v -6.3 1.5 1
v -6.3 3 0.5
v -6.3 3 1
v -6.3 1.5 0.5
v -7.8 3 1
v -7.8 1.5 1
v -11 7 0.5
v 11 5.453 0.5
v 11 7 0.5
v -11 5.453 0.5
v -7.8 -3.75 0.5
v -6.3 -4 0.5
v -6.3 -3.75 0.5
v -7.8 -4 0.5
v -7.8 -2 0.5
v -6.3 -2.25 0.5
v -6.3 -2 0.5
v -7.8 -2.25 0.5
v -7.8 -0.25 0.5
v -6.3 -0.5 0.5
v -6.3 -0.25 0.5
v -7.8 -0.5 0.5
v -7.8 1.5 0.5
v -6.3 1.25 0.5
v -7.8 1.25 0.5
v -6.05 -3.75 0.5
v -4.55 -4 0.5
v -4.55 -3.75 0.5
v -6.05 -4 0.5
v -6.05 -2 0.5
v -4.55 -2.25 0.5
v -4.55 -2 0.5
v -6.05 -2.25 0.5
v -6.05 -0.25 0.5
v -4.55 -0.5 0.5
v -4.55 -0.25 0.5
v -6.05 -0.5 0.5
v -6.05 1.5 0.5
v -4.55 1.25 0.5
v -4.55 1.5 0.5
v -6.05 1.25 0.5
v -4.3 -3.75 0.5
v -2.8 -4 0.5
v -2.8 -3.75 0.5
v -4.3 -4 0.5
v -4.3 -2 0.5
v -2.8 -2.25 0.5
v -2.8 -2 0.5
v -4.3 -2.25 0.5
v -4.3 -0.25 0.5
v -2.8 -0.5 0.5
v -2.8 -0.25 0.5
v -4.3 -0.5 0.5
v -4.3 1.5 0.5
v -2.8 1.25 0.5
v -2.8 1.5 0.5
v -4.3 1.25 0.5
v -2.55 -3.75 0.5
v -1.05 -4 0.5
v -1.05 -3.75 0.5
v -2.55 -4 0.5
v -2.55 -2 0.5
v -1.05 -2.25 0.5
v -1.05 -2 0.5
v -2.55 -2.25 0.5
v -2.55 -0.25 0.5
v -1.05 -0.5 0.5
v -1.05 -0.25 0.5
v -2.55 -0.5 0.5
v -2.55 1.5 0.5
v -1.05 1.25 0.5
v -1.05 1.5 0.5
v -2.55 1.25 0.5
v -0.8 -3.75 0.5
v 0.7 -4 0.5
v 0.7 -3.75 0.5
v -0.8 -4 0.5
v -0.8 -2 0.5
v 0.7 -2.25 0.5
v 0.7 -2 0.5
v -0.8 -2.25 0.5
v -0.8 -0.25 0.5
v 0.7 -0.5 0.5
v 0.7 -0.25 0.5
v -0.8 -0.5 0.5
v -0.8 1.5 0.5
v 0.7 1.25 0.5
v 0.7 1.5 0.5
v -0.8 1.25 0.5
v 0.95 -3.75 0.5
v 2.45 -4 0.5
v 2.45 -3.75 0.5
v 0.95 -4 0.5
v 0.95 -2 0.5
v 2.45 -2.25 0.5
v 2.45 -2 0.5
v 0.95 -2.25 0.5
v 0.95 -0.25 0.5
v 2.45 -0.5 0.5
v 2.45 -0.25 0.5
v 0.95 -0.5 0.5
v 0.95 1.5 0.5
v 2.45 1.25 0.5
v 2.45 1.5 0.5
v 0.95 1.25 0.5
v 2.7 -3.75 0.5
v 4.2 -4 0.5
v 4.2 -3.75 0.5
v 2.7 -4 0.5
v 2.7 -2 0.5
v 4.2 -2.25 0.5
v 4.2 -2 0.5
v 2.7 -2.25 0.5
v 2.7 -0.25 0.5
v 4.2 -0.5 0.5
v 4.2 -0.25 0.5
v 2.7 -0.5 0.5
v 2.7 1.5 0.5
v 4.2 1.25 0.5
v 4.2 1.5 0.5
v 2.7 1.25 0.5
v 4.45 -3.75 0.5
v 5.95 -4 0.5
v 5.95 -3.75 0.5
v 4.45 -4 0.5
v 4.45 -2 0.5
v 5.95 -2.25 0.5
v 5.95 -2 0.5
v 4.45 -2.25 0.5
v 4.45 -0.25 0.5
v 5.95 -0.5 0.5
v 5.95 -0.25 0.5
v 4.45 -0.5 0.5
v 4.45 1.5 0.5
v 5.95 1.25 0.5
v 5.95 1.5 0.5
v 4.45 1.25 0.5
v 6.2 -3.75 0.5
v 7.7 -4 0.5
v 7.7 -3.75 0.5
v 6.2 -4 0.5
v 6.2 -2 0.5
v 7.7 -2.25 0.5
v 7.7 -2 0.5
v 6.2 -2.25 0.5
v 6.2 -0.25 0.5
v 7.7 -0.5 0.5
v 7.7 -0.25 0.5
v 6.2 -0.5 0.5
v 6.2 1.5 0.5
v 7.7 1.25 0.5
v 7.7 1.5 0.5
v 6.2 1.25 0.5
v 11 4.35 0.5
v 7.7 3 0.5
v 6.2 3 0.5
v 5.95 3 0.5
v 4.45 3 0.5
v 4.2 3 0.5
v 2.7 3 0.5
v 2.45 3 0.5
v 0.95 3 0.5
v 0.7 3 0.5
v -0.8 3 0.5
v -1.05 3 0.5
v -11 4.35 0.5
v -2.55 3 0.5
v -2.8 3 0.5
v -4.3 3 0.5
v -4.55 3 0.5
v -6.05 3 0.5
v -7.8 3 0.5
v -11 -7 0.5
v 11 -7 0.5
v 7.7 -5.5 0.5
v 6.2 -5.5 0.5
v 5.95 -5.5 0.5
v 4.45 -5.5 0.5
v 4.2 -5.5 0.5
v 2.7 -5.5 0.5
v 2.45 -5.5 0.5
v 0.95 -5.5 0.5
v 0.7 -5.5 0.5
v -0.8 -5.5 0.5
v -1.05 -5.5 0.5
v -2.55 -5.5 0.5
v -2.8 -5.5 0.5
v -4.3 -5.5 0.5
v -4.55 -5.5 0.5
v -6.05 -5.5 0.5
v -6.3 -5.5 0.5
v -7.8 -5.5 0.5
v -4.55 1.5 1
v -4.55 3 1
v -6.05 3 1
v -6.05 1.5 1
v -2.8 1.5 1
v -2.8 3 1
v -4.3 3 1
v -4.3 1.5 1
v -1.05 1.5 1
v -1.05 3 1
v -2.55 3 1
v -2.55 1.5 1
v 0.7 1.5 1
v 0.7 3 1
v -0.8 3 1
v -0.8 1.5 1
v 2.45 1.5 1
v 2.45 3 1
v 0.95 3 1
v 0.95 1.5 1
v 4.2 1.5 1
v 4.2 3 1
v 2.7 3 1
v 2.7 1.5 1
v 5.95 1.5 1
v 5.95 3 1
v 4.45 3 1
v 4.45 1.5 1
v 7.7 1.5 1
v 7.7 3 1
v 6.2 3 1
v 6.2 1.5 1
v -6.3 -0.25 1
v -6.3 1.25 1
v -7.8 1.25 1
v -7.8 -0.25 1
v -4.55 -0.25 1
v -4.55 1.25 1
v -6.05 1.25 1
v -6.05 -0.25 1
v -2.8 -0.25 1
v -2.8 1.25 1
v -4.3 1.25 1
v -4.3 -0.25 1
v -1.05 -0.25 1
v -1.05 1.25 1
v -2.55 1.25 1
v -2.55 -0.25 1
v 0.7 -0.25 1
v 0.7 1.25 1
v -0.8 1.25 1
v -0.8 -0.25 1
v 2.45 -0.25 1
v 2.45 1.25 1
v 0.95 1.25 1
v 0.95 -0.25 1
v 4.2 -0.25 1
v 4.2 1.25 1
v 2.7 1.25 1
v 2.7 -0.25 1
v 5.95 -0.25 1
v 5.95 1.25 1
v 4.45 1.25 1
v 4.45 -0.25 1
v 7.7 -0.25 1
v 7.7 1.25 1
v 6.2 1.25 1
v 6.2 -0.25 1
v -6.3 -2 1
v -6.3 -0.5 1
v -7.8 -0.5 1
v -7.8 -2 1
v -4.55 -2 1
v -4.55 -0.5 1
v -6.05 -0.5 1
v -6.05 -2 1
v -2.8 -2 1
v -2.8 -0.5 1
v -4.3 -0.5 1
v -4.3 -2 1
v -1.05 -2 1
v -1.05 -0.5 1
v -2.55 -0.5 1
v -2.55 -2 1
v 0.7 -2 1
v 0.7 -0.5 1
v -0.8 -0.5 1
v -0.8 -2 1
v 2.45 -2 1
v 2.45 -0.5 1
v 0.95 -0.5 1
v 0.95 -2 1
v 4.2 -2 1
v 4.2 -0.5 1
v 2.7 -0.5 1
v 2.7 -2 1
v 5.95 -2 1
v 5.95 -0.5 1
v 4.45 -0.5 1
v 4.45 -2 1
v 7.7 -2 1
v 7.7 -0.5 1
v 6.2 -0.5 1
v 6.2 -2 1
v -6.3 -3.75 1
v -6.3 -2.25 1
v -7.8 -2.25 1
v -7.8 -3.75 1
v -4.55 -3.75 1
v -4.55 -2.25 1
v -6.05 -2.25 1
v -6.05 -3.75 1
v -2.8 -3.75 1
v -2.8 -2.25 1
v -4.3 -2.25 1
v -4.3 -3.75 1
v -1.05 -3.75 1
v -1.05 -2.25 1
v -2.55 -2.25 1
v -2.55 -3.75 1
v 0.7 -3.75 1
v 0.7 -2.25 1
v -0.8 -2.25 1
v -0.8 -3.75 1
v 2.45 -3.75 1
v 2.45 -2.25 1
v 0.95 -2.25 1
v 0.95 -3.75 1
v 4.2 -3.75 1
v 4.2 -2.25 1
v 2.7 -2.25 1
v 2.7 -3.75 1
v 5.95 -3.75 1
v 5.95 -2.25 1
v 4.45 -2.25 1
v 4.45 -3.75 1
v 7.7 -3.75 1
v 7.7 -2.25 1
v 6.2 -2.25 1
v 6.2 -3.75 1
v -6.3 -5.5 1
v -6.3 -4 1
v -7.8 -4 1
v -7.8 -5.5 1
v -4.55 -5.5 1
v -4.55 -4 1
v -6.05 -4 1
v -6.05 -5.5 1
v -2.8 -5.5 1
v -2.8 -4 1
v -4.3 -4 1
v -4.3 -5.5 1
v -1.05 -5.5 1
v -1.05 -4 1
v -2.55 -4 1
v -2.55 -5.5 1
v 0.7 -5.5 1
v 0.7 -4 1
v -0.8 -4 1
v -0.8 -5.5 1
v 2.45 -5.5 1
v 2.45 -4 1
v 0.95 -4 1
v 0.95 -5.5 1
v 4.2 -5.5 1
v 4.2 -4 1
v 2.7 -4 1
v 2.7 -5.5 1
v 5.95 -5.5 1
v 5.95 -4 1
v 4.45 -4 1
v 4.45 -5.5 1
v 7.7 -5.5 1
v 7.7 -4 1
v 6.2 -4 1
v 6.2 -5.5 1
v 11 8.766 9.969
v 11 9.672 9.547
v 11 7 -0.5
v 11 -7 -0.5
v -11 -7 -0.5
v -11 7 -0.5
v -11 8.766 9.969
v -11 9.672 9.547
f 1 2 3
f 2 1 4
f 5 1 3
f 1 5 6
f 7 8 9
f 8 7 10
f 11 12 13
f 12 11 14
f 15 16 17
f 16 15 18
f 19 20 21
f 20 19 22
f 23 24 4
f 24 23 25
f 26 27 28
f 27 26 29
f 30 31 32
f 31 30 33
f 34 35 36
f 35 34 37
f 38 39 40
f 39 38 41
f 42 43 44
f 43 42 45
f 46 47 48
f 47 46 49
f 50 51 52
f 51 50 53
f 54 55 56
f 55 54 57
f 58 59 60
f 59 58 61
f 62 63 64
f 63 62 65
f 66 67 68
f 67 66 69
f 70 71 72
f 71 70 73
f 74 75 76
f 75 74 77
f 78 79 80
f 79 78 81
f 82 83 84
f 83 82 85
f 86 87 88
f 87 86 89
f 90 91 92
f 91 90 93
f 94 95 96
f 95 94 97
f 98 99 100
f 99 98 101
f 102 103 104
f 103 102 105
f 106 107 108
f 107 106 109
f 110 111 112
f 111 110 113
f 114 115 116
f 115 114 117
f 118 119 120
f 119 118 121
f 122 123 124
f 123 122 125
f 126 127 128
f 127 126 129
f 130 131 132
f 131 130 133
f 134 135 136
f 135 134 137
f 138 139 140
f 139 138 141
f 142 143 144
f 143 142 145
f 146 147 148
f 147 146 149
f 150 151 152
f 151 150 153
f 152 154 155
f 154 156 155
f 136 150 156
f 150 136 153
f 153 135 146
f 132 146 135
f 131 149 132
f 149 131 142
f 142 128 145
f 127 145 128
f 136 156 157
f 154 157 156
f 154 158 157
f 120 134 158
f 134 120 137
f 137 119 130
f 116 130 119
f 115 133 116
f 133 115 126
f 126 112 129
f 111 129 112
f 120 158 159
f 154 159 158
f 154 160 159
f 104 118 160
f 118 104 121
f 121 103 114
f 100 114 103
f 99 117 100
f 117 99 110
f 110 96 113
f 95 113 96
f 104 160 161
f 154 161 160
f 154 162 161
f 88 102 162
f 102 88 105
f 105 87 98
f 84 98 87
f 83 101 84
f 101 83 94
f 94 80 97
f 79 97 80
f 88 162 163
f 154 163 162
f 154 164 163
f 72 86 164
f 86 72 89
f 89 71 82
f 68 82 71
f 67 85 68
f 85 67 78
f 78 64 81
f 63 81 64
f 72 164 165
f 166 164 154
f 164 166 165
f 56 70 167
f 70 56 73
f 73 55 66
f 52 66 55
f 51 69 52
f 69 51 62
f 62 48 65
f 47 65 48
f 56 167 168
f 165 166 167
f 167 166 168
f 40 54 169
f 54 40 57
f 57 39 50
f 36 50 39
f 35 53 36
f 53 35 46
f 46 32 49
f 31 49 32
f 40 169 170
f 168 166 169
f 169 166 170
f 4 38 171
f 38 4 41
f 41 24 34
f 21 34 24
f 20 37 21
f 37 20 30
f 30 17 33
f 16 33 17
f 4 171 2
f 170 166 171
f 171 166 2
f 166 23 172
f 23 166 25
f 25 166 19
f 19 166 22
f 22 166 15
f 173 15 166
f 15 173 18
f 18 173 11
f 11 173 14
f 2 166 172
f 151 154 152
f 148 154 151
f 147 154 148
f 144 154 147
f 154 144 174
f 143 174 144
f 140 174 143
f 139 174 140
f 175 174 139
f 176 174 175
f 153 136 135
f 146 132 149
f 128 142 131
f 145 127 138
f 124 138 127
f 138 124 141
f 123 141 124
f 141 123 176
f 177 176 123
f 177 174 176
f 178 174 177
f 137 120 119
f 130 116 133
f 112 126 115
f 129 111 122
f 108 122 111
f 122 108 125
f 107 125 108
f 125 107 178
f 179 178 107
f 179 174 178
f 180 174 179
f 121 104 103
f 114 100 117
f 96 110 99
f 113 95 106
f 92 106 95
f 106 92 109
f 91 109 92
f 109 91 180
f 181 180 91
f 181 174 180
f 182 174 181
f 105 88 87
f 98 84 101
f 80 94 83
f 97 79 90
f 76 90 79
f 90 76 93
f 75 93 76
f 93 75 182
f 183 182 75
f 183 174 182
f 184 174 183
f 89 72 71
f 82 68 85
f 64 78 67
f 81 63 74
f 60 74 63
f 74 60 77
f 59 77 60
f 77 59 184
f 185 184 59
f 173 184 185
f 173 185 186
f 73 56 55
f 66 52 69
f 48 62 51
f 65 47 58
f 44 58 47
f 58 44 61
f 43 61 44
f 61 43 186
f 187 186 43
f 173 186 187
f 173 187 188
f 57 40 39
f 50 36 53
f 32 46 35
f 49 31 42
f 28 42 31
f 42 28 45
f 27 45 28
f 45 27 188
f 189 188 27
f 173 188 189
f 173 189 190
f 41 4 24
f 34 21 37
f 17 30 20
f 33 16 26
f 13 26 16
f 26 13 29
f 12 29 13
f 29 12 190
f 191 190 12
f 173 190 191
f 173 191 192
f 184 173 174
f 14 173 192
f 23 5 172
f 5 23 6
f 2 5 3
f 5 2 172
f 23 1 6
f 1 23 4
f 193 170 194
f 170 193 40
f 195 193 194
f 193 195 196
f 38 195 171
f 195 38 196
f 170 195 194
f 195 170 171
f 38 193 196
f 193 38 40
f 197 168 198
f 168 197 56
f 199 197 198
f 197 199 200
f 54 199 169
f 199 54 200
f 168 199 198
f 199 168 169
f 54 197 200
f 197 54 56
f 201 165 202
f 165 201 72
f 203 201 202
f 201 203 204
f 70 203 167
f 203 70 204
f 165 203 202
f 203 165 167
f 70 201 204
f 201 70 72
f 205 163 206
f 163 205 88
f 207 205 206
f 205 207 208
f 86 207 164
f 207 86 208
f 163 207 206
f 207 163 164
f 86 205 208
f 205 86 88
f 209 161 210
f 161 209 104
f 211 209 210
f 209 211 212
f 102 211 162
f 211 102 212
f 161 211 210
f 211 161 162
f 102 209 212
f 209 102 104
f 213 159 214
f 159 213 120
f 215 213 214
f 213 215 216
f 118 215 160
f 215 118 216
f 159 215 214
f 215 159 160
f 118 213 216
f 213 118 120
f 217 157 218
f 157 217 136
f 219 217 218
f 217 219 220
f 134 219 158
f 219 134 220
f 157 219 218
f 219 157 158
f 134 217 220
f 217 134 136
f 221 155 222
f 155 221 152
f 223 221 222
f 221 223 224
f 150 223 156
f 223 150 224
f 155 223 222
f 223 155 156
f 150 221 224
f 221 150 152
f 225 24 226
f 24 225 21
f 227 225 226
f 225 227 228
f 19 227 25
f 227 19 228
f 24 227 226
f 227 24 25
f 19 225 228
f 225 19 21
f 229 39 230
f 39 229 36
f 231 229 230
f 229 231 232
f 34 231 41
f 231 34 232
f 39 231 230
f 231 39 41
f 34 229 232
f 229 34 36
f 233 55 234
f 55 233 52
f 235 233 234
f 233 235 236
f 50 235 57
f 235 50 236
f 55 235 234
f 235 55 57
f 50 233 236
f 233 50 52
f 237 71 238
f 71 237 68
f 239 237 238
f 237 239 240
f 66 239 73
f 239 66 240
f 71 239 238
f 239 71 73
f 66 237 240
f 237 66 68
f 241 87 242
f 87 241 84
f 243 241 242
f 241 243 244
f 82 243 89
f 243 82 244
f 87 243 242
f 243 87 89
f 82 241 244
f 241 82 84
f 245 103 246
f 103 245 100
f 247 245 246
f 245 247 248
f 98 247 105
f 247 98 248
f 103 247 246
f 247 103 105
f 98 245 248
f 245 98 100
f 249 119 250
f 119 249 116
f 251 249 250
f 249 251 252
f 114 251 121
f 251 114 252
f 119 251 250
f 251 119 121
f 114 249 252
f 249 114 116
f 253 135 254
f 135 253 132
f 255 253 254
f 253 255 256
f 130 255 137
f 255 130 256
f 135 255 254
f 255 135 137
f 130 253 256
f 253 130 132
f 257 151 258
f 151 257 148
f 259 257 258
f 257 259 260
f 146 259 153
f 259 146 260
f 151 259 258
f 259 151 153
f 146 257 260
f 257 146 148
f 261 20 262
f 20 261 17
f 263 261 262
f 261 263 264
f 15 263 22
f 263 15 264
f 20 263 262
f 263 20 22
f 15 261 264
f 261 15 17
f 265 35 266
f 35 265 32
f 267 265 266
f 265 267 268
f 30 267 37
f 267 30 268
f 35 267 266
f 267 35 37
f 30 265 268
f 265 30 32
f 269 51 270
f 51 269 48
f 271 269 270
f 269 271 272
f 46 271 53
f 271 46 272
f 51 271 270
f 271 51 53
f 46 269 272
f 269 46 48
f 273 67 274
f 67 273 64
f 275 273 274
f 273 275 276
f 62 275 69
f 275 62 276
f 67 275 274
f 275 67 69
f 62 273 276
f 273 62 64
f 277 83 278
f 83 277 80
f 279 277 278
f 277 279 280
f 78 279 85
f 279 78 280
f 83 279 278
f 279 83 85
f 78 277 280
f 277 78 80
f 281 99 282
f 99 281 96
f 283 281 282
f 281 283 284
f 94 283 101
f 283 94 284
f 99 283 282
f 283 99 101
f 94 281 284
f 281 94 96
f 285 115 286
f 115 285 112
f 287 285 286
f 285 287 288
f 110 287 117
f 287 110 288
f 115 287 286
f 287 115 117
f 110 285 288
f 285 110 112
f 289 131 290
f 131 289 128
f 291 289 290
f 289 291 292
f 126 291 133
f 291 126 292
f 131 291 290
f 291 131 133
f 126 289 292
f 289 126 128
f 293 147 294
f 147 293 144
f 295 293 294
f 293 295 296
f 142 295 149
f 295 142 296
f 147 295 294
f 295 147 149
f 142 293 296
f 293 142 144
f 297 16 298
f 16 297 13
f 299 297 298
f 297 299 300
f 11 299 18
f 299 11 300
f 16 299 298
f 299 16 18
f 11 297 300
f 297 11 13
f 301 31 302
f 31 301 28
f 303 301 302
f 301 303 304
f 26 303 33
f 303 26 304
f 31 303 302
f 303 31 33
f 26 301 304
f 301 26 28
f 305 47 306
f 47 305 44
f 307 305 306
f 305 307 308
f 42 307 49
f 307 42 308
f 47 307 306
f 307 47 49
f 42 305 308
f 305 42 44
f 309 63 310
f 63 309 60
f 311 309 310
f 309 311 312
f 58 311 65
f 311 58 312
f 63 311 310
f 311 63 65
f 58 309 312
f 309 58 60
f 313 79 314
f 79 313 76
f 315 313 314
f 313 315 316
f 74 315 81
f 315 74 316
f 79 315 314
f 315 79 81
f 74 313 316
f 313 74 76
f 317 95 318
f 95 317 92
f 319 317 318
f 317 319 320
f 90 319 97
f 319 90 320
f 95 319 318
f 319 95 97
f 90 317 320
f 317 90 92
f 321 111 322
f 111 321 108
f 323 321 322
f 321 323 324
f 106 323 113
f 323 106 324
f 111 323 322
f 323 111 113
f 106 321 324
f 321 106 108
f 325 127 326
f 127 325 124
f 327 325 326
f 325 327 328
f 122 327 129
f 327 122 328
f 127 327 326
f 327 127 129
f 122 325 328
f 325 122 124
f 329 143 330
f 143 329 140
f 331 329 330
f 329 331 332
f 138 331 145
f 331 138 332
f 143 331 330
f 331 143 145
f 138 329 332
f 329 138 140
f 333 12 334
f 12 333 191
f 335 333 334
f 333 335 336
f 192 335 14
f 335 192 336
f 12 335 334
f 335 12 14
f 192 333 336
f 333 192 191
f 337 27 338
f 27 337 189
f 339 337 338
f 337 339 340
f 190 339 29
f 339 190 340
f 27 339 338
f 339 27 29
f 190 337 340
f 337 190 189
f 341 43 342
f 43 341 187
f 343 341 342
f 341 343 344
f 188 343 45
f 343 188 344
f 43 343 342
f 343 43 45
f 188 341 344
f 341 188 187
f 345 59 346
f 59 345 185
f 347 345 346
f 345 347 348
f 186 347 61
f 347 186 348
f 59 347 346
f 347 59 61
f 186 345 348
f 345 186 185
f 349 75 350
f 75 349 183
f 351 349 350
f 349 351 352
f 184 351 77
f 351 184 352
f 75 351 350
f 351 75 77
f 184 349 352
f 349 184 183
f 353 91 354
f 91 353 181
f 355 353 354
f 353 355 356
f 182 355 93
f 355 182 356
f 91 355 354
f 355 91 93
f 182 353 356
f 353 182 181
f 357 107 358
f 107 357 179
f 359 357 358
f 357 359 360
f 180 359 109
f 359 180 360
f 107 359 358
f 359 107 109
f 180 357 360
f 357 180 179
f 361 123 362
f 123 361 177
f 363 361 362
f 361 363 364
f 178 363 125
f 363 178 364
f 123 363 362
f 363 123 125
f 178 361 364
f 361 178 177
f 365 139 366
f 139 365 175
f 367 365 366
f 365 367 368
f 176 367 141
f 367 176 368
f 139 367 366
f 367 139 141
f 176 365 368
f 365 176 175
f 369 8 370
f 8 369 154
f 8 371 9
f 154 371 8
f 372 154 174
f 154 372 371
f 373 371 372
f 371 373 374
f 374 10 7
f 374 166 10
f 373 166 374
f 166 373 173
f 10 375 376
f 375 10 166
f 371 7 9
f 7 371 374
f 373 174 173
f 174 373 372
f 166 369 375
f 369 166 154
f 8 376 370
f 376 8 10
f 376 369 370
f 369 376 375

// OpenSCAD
bganX = 22;
bganY = 14;
bganZ = 1;
keyX = 1.5;
keyY = 1.5;
keyZ = 0.5;
keySpacing = 0.25;
keyStartingY = 4;

startX = -8.8;

module keyRow() {
    for(i=[1:9]) {
        translate([startX + (i*(keyX+keySpacing)),0,(bganZ/2)+(keyZ/2)]) {
            cube([keyX, keyY, keyZ], true);
        }
    }
}
cube([bganX,bganY,bganZ], true);
translate([0,(bganY/2),(bganY/2)-bganZ*2]) {
    rotate([65,0,0]) {
        cube([bganX,bganY*.75,bganZ], true);
    }
}
for(j=[1:5]) {
    translate([0,keyStartingY+(j*(-(keyY+keySpacing))),0]) {
        keyRow();
    }
}
